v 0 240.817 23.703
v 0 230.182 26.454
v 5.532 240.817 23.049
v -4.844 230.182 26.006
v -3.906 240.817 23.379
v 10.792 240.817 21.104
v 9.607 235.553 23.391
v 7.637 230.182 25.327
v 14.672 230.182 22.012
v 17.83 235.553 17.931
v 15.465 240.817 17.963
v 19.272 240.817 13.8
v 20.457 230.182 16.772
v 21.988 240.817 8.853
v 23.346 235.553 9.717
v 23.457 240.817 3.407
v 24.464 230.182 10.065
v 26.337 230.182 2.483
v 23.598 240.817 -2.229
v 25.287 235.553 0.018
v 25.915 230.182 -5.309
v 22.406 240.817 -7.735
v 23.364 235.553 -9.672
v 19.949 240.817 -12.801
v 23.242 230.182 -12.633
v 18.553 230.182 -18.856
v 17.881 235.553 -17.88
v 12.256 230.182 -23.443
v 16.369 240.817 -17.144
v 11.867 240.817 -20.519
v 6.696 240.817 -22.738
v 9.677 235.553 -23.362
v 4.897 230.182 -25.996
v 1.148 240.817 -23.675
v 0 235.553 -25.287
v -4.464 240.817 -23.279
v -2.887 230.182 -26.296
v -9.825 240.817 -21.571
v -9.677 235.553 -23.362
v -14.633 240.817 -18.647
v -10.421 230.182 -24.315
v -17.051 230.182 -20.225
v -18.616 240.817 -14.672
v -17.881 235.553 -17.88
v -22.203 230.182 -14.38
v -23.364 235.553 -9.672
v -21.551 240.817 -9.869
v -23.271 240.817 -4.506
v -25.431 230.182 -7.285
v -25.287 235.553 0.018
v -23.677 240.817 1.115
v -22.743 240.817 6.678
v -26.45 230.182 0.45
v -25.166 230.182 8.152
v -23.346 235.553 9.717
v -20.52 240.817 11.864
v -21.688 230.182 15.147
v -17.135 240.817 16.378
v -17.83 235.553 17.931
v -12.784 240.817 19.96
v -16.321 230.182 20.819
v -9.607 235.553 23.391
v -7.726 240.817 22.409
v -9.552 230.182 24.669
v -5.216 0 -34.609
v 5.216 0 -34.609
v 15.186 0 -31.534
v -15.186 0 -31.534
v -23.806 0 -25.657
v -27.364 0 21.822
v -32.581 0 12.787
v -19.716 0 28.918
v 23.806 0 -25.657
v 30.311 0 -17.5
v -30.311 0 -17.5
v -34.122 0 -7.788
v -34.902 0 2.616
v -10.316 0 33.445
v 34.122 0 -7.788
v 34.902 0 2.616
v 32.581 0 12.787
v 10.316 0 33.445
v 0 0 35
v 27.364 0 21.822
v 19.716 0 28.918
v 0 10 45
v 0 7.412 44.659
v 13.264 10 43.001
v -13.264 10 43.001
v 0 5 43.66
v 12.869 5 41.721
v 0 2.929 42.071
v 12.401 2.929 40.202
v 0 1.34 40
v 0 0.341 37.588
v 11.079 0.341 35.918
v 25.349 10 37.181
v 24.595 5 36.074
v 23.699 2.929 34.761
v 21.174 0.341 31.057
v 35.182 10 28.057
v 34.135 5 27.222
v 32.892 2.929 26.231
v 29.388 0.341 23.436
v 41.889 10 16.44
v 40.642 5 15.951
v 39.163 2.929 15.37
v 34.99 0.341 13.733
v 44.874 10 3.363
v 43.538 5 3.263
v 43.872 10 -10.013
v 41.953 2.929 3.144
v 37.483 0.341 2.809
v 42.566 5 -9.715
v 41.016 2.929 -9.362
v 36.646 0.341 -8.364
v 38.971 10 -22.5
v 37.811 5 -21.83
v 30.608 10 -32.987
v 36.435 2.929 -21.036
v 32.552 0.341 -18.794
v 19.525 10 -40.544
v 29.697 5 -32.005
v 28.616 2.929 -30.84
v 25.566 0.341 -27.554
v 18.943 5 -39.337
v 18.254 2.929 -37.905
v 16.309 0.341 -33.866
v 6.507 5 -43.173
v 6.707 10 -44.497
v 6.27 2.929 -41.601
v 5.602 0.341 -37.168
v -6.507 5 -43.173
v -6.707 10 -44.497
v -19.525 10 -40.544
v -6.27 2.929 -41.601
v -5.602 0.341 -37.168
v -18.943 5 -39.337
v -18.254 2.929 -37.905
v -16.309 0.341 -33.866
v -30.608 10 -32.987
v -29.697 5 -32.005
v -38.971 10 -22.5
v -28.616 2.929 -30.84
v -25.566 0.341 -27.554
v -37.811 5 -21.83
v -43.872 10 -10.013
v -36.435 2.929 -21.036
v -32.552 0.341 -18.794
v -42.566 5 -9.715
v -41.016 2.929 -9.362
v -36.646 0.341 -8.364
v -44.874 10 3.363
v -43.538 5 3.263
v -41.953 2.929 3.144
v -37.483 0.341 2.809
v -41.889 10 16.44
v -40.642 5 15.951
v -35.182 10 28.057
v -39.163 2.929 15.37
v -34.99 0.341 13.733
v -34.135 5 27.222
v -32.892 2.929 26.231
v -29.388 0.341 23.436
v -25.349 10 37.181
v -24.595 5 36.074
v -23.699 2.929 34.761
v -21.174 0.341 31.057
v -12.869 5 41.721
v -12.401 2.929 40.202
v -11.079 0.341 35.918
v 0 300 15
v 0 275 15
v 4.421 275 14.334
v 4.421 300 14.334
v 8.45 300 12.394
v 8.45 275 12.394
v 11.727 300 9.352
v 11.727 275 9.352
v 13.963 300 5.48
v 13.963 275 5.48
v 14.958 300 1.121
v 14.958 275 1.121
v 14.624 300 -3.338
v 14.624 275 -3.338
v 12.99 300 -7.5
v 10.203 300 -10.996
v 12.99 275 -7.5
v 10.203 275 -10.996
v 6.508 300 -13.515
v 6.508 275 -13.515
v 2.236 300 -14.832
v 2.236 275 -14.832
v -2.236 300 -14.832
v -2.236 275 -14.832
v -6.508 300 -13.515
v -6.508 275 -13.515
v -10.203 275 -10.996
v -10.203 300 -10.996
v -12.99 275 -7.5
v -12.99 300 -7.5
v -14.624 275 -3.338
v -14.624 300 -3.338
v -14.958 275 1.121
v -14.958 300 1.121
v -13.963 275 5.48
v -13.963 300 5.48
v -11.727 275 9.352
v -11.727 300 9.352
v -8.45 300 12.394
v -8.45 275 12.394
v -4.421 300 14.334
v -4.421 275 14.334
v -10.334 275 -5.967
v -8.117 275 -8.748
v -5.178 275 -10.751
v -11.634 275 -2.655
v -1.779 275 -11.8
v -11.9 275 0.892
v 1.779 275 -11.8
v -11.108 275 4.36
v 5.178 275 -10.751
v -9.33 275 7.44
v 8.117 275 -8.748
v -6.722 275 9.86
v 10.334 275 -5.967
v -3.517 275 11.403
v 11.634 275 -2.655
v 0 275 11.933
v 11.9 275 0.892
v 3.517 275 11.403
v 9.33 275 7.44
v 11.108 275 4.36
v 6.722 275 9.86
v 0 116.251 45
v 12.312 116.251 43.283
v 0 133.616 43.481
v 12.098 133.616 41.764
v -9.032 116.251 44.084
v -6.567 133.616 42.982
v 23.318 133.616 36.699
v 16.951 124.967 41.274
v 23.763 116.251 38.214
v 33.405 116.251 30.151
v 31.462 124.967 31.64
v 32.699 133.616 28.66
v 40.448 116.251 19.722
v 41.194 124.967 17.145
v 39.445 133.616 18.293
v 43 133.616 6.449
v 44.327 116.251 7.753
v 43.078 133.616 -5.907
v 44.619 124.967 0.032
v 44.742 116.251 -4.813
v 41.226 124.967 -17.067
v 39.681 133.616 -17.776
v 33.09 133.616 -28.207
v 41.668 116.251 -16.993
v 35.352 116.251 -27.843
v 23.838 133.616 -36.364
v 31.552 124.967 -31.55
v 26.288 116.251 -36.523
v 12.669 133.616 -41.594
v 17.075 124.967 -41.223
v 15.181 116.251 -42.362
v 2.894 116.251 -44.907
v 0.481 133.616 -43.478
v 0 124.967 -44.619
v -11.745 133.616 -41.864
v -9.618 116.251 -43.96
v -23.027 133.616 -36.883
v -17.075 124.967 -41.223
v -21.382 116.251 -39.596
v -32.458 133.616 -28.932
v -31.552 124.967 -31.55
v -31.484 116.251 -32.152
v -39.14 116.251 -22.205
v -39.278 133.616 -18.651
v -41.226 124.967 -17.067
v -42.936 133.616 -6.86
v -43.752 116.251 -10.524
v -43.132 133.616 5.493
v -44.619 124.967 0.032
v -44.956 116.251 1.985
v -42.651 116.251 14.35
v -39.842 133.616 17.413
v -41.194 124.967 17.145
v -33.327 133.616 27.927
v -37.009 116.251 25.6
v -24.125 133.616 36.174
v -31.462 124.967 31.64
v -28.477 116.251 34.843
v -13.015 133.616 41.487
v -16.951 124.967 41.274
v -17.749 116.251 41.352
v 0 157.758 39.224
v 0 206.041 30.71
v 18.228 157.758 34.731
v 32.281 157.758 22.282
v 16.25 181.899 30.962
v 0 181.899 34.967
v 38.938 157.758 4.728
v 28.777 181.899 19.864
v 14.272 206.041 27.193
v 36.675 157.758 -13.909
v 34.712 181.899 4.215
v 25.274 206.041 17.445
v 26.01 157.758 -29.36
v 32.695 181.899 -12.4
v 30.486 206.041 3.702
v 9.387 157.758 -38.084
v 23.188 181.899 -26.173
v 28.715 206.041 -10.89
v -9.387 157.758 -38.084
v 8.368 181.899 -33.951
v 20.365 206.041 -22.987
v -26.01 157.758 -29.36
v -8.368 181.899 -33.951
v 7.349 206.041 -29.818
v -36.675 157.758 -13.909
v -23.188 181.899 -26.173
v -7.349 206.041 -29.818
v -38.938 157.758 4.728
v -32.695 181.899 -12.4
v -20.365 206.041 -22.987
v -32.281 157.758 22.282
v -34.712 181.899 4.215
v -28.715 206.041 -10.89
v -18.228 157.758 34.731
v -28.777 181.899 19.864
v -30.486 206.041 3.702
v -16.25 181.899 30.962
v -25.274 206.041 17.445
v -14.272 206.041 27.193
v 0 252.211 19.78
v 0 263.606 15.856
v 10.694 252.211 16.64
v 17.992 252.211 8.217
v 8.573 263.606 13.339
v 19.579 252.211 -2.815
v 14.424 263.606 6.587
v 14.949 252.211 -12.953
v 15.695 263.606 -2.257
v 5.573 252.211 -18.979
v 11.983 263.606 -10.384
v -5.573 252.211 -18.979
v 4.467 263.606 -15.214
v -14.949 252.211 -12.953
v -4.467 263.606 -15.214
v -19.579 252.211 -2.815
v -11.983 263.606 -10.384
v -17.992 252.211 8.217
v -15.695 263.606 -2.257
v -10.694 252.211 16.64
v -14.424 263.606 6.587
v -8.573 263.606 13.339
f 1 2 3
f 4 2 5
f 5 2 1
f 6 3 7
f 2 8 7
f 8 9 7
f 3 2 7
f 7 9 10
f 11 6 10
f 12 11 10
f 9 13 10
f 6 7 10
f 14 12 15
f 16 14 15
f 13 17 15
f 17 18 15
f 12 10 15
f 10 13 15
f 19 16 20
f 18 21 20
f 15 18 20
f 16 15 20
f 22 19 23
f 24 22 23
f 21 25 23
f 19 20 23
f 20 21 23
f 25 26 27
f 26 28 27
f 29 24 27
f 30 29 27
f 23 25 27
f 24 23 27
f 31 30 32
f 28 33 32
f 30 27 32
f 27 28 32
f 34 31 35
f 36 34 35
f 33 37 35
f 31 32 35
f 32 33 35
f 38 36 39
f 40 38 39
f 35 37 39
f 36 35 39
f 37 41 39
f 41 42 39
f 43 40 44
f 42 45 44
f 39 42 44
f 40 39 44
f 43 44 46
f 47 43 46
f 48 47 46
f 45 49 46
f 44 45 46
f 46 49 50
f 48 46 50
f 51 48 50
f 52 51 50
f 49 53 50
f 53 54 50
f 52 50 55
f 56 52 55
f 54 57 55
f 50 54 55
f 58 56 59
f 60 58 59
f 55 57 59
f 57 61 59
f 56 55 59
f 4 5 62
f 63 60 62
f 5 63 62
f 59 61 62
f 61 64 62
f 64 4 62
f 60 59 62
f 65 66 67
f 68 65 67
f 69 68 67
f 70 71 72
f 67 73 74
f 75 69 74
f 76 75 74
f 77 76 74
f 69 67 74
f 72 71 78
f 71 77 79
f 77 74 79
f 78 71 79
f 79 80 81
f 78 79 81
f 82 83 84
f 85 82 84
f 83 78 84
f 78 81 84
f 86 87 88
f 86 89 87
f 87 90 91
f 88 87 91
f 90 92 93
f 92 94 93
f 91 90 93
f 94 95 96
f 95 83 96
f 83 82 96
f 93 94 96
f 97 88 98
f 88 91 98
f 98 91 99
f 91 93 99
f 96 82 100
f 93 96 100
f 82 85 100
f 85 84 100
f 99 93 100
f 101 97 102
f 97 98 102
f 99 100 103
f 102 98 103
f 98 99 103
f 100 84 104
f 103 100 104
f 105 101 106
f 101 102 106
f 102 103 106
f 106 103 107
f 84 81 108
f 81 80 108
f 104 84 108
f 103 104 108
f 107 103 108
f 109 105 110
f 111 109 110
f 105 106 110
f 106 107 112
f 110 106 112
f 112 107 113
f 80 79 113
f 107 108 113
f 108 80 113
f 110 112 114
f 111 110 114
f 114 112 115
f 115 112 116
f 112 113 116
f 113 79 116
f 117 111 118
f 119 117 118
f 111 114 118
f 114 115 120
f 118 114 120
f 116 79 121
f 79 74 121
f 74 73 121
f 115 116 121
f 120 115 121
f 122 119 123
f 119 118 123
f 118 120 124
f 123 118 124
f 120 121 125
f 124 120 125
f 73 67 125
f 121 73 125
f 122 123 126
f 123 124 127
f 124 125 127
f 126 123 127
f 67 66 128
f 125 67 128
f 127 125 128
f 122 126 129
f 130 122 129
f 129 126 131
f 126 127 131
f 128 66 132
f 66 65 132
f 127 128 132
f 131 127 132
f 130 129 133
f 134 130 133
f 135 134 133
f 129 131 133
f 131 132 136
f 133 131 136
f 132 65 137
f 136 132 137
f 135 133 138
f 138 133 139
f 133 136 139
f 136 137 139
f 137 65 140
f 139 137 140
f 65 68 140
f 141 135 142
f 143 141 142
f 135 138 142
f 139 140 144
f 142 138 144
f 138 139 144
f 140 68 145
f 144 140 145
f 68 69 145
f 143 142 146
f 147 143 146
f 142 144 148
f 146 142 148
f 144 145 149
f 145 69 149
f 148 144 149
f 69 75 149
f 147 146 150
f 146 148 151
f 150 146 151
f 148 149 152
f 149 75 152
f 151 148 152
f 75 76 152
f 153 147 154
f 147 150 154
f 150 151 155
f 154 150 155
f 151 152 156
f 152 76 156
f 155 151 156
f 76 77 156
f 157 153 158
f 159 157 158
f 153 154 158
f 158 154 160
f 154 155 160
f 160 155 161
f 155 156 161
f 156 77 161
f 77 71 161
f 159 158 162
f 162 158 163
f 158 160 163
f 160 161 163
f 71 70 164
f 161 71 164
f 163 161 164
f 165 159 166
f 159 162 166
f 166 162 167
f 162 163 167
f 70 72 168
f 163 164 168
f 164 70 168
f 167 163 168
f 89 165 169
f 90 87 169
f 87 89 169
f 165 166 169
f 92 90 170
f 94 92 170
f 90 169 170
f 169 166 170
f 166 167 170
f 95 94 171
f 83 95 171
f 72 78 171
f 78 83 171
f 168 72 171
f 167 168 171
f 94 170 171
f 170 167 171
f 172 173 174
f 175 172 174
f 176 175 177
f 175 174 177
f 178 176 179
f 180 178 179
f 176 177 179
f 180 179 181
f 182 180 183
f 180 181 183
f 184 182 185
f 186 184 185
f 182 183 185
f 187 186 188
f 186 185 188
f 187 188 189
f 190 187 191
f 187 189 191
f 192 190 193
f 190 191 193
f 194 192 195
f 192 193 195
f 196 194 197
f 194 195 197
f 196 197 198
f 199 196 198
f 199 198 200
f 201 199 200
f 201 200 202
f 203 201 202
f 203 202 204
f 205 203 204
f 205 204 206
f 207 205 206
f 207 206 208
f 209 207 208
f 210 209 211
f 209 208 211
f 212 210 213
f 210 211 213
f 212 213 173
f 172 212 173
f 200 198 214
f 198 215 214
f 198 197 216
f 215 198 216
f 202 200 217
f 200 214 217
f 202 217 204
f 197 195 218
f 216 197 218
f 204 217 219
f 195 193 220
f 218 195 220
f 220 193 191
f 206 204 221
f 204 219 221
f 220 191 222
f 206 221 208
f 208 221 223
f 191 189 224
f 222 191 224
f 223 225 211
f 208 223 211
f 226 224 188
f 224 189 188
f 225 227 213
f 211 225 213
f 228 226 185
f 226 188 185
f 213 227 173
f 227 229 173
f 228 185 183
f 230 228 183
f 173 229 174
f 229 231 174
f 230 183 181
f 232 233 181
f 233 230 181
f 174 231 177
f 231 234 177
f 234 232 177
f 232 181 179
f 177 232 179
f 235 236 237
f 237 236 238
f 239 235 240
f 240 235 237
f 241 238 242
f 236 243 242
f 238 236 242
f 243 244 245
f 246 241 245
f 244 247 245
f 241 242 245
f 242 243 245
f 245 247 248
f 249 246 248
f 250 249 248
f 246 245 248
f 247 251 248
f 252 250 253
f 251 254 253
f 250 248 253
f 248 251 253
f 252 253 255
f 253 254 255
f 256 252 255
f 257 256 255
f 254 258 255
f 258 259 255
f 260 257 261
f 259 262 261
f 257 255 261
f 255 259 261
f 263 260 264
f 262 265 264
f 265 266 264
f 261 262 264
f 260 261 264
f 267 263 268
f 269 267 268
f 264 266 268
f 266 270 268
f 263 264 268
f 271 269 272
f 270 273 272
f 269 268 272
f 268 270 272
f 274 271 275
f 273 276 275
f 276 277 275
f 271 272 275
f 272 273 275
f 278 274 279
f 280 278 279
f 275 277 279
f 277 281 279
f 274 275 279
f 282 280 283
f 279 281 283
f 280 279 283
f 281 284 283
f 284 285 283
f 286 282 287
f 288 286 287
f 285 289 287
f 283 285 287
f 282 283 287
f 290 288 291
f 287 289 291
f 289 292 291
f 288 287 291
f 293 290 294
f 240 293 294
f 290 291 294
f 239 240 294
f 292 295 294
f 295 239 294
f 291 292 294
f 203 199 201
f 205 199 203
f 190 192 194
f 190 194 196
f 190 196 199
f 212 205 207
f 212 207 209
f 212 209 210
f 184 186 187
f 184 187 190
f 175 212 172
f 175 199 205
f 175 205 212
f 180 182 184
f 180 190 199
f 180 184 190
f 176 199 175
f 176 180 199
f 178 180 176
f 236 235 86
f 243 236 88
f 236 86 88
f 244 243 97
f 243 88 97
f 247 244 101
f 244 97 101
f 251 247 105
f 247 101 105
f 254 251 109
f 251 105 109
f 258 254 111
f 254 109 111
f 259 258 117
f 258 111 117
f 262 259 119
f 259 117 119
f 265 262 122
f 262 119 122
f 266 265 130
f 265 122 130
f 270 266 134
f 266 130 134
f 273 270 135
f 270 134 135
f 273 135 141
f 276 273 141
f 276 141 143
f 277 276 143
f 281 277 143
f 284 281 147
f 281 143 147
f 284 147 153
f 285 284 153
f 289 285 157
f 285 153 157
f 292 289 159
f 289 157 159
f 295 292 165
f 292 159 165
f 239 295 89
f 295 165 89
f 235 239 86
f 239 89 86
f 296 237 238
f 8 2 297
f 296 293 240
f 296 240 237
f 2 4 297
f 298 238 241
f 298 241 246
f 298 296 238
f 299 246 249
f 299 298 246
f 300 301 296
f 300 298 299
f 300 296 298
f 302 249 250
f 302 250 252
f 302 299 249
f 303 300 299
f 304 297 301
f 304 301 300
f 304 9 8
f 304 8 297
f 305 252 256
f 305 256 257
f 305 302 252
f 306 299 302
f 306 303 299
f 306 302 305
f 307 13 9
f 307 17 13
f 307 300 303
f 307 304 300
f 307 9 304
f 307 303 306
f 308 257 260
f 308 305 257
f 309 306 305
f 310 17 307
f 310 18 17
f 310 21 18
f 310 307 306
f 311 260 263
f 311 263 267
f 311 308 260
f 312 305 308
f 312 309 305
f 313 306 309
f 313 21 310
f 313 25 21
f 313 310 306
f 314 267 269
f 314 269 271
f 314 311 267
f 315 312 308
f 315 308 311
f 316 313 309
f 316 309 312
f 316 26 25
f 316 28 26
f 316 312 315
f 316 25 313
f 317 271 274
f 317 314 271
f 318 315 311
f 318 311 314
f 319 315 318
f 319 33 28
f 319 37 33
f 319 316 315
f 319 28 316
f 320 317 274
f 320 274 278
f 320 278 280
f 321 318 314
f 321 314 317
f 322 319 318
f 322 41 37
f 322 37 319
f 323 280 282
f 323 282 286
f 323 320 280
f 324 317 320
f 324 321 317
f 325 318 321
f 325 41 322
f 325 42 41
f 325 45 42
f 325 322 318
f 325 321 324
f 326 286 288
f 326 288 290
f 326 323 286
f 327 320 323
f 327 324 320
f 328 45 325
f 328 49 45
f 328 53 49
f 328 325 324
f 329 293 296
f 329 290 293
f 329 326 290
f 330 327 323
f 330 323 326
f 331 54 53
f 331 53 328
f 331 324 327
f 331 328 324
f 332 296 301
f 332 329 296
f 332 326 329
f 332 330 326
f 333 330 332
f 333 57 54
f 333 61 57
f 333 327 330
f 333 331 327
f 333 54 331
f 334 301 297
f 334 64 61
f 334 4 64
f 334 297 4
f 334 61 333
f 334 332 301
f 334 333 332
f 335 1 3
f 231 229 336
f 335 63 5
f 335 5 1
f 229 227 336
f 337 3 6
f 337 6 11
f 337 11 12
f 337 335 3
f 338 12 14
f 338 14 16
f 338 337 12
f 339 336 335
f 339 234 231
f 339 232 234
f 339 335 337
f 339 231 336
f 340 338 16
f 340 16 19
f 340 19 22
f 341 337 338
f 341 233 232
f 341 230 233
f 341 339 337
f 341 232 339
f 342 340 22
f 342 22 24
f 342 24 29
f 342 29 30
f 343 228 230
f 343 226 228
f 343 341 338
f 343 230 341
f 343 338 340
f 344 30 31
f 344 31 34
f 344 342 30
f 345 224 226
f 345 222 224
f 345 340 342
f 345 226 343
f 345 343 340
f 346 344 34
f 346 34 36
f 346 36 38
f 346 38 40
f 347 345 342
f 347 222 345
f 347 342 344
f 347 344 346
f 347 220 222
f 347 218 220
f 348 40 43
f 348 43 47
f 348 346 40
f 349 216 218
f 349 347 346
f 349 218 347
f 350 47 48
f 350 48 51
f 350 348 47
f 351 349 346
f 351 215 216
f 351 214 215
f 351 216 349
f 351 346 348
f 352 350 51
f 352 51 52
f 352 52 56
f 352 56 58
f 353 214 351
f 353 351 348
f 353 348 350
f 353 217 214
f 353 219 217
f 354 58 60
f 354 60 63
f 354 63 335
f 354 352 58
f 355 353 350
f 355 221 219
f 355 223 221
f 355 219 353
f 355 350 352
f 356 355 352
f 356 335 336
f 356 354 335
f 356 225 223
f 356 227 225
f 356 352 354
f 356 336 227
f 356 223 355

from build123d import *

# Parameters (mm, degrees)
SKETCH1_R           = 45
BOSS_EXTRUDE1_DEPTH = 275
FILLET1_R           = 10
CHAMFER1_SIZE       = 150
CHAMFER1_SIZE2      = 26.449047106
FILLET2_R           = 100
CHAMFER2_SIZE       = 40
CHAMFER2_SIZE2      = 6.617933019
FILLET3_R           = 70
SKETCH2_R           = 15
BOSS_EXTRUDE2_DEPTH = 25


with BuildPart() as part:
    # Sketch1 → Boss-Extrude1 (new body)
    with BuildSketch(Plane(origin=(0, 0, 0), x_dir=(1, 0, 0), z_dir=(0, 1, 0))):
        with Locations(Location((0, 0, 0), (0, 0, 270))):
            Circle(SKETCH1_R)
    extrude(amount=BOSS_EXTRUDE1_DEPTH)

    # Fillet1
    fillet1_edges = [part.edges().sort_by_distance(p)[0] for p in [
        (0, 0, -45),
    ]]
    fillet(fillet1_edges, radius=FILLET1_R)

    # Chamfer1
    chamfer1_edges = [part.edges().sort_by_distance(p)[0] for p in [
        (0, 275, -45),
    ]]
    chamfer1_side = [part.faces().sort_by_distance(p)[0] for p in [
        (0, 142.5, -45),
    ]]
    chamfer(chamfer1_edges, length=CHAMFER1_SIZE, length2=CHAMFER1_SIZE2, reference=chamfer1_side[0])

    # Fillet2
    fillet2_edges = [part.edges().sort_by_distance(p)[0] for p in [
        (0, 125, -45),
    ]]
    fillet(fillet2_edges, radius=FILLET2_R)

    # Chamfer2
    chamfer2_edges = [part.edges().sort_by_distance(p)[0] for p in [
        (0, 275, -18.550952894),
    ]]
    chamfer2_side = [part.faces().sort_by_distance(p)[0] for p in [
        (0, 204.307975707, -31.015864097),
    ]]
    chamfer(chamfer2_edges, length=CHAMFER2_SIZE, length2=CHAMFER2_SIZE2, reference=chamfer2_side[0])

    # Fillet3
    fillet3_edges = [part.edges().sort_by_distance(p)[0] for p in [
        (0, 235.60768988, -25.49688),
    ]]
    fillet(fillet3_edges, radius=FILLET3_R)

    # Sketch2 → Boss-Extrude2 (add)
    with BuildSketch(Plane(origin=(0, 275, 0), x_dir=(1, 0, 0), z_dir=(0, 1, 0))):
        with Locations(Location((0, 0, 0), (0, 0, 270))):
            Circle(SKETCH2_R)
    extrude(amount=BOSS_EXTRUDE2_DEPTH)


solid = part.part
